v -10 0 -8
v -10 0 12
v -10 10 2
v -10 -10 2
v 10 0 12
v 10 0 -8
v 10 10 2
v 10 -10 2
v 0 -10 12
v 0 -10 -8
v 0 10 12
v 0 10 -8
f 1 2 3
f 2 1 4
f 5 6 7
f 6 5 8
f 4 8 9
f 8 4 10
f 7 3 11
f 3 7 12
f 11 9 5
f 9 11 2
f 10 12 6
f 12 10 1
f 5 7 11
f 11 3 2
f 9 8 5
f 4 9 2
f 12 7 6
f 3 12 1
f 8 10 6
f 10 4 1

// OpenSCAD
translate([0,0,2]) {
    scale(10) {
        polyhedron(
            points=[
               [-1,0,+1], //  0
               [+1,0,+1], //  1
               [0,-1,+1], //  2
               [0,+1,+1], //  3

               [-1,0,-1], //  4
               [+1,0,-1], //  5
               [0,-1,-1], //  6
               [0,+1,-1], //  7

               [-1,-1,0], //  8
               [+1,-1,0], //  9
               [-1,+1,0], // 10
               [+1,+1,0]  // 11
            ],
            faces=[
               [0, 8, 4, 10], // x == -1
               [9, 1, 11, 5], // x == +1
               [8, 2, 9,  6], // y == -1
               [3,10, 7, 11], // y == -1
               [2, 0, 3,  1], // z == +1
               [5, 7, 4,  6], // z == -1
               [3, 11, 1],    // (x >= 0) && (y >= 0) && (z >= 0)
               [0, 10, 3],    // (x <= 0) && (y >= 0) && (z >= 0)
               [1, 9, 2],     // (x >= 0) && (y <= 0) && (z >= 0)
               [0, 2, 8],     // (x <= 0) && (y <= 0) && (z >= 0)
               [5, 11, 7],    // (x >= 0) && (y >= 0) && (z <= 0)
               [4, 7, 10],    // (x <= 0) && (y >= 0) && (z <= 0)
               [5, 6, 9],     // (x >= 0) && (y <= 0) && (z <= 0)
               [4, 8, 6],     // (x <= 0) && (y <= 0) && (z <= 0)
            ]);
    }
}
